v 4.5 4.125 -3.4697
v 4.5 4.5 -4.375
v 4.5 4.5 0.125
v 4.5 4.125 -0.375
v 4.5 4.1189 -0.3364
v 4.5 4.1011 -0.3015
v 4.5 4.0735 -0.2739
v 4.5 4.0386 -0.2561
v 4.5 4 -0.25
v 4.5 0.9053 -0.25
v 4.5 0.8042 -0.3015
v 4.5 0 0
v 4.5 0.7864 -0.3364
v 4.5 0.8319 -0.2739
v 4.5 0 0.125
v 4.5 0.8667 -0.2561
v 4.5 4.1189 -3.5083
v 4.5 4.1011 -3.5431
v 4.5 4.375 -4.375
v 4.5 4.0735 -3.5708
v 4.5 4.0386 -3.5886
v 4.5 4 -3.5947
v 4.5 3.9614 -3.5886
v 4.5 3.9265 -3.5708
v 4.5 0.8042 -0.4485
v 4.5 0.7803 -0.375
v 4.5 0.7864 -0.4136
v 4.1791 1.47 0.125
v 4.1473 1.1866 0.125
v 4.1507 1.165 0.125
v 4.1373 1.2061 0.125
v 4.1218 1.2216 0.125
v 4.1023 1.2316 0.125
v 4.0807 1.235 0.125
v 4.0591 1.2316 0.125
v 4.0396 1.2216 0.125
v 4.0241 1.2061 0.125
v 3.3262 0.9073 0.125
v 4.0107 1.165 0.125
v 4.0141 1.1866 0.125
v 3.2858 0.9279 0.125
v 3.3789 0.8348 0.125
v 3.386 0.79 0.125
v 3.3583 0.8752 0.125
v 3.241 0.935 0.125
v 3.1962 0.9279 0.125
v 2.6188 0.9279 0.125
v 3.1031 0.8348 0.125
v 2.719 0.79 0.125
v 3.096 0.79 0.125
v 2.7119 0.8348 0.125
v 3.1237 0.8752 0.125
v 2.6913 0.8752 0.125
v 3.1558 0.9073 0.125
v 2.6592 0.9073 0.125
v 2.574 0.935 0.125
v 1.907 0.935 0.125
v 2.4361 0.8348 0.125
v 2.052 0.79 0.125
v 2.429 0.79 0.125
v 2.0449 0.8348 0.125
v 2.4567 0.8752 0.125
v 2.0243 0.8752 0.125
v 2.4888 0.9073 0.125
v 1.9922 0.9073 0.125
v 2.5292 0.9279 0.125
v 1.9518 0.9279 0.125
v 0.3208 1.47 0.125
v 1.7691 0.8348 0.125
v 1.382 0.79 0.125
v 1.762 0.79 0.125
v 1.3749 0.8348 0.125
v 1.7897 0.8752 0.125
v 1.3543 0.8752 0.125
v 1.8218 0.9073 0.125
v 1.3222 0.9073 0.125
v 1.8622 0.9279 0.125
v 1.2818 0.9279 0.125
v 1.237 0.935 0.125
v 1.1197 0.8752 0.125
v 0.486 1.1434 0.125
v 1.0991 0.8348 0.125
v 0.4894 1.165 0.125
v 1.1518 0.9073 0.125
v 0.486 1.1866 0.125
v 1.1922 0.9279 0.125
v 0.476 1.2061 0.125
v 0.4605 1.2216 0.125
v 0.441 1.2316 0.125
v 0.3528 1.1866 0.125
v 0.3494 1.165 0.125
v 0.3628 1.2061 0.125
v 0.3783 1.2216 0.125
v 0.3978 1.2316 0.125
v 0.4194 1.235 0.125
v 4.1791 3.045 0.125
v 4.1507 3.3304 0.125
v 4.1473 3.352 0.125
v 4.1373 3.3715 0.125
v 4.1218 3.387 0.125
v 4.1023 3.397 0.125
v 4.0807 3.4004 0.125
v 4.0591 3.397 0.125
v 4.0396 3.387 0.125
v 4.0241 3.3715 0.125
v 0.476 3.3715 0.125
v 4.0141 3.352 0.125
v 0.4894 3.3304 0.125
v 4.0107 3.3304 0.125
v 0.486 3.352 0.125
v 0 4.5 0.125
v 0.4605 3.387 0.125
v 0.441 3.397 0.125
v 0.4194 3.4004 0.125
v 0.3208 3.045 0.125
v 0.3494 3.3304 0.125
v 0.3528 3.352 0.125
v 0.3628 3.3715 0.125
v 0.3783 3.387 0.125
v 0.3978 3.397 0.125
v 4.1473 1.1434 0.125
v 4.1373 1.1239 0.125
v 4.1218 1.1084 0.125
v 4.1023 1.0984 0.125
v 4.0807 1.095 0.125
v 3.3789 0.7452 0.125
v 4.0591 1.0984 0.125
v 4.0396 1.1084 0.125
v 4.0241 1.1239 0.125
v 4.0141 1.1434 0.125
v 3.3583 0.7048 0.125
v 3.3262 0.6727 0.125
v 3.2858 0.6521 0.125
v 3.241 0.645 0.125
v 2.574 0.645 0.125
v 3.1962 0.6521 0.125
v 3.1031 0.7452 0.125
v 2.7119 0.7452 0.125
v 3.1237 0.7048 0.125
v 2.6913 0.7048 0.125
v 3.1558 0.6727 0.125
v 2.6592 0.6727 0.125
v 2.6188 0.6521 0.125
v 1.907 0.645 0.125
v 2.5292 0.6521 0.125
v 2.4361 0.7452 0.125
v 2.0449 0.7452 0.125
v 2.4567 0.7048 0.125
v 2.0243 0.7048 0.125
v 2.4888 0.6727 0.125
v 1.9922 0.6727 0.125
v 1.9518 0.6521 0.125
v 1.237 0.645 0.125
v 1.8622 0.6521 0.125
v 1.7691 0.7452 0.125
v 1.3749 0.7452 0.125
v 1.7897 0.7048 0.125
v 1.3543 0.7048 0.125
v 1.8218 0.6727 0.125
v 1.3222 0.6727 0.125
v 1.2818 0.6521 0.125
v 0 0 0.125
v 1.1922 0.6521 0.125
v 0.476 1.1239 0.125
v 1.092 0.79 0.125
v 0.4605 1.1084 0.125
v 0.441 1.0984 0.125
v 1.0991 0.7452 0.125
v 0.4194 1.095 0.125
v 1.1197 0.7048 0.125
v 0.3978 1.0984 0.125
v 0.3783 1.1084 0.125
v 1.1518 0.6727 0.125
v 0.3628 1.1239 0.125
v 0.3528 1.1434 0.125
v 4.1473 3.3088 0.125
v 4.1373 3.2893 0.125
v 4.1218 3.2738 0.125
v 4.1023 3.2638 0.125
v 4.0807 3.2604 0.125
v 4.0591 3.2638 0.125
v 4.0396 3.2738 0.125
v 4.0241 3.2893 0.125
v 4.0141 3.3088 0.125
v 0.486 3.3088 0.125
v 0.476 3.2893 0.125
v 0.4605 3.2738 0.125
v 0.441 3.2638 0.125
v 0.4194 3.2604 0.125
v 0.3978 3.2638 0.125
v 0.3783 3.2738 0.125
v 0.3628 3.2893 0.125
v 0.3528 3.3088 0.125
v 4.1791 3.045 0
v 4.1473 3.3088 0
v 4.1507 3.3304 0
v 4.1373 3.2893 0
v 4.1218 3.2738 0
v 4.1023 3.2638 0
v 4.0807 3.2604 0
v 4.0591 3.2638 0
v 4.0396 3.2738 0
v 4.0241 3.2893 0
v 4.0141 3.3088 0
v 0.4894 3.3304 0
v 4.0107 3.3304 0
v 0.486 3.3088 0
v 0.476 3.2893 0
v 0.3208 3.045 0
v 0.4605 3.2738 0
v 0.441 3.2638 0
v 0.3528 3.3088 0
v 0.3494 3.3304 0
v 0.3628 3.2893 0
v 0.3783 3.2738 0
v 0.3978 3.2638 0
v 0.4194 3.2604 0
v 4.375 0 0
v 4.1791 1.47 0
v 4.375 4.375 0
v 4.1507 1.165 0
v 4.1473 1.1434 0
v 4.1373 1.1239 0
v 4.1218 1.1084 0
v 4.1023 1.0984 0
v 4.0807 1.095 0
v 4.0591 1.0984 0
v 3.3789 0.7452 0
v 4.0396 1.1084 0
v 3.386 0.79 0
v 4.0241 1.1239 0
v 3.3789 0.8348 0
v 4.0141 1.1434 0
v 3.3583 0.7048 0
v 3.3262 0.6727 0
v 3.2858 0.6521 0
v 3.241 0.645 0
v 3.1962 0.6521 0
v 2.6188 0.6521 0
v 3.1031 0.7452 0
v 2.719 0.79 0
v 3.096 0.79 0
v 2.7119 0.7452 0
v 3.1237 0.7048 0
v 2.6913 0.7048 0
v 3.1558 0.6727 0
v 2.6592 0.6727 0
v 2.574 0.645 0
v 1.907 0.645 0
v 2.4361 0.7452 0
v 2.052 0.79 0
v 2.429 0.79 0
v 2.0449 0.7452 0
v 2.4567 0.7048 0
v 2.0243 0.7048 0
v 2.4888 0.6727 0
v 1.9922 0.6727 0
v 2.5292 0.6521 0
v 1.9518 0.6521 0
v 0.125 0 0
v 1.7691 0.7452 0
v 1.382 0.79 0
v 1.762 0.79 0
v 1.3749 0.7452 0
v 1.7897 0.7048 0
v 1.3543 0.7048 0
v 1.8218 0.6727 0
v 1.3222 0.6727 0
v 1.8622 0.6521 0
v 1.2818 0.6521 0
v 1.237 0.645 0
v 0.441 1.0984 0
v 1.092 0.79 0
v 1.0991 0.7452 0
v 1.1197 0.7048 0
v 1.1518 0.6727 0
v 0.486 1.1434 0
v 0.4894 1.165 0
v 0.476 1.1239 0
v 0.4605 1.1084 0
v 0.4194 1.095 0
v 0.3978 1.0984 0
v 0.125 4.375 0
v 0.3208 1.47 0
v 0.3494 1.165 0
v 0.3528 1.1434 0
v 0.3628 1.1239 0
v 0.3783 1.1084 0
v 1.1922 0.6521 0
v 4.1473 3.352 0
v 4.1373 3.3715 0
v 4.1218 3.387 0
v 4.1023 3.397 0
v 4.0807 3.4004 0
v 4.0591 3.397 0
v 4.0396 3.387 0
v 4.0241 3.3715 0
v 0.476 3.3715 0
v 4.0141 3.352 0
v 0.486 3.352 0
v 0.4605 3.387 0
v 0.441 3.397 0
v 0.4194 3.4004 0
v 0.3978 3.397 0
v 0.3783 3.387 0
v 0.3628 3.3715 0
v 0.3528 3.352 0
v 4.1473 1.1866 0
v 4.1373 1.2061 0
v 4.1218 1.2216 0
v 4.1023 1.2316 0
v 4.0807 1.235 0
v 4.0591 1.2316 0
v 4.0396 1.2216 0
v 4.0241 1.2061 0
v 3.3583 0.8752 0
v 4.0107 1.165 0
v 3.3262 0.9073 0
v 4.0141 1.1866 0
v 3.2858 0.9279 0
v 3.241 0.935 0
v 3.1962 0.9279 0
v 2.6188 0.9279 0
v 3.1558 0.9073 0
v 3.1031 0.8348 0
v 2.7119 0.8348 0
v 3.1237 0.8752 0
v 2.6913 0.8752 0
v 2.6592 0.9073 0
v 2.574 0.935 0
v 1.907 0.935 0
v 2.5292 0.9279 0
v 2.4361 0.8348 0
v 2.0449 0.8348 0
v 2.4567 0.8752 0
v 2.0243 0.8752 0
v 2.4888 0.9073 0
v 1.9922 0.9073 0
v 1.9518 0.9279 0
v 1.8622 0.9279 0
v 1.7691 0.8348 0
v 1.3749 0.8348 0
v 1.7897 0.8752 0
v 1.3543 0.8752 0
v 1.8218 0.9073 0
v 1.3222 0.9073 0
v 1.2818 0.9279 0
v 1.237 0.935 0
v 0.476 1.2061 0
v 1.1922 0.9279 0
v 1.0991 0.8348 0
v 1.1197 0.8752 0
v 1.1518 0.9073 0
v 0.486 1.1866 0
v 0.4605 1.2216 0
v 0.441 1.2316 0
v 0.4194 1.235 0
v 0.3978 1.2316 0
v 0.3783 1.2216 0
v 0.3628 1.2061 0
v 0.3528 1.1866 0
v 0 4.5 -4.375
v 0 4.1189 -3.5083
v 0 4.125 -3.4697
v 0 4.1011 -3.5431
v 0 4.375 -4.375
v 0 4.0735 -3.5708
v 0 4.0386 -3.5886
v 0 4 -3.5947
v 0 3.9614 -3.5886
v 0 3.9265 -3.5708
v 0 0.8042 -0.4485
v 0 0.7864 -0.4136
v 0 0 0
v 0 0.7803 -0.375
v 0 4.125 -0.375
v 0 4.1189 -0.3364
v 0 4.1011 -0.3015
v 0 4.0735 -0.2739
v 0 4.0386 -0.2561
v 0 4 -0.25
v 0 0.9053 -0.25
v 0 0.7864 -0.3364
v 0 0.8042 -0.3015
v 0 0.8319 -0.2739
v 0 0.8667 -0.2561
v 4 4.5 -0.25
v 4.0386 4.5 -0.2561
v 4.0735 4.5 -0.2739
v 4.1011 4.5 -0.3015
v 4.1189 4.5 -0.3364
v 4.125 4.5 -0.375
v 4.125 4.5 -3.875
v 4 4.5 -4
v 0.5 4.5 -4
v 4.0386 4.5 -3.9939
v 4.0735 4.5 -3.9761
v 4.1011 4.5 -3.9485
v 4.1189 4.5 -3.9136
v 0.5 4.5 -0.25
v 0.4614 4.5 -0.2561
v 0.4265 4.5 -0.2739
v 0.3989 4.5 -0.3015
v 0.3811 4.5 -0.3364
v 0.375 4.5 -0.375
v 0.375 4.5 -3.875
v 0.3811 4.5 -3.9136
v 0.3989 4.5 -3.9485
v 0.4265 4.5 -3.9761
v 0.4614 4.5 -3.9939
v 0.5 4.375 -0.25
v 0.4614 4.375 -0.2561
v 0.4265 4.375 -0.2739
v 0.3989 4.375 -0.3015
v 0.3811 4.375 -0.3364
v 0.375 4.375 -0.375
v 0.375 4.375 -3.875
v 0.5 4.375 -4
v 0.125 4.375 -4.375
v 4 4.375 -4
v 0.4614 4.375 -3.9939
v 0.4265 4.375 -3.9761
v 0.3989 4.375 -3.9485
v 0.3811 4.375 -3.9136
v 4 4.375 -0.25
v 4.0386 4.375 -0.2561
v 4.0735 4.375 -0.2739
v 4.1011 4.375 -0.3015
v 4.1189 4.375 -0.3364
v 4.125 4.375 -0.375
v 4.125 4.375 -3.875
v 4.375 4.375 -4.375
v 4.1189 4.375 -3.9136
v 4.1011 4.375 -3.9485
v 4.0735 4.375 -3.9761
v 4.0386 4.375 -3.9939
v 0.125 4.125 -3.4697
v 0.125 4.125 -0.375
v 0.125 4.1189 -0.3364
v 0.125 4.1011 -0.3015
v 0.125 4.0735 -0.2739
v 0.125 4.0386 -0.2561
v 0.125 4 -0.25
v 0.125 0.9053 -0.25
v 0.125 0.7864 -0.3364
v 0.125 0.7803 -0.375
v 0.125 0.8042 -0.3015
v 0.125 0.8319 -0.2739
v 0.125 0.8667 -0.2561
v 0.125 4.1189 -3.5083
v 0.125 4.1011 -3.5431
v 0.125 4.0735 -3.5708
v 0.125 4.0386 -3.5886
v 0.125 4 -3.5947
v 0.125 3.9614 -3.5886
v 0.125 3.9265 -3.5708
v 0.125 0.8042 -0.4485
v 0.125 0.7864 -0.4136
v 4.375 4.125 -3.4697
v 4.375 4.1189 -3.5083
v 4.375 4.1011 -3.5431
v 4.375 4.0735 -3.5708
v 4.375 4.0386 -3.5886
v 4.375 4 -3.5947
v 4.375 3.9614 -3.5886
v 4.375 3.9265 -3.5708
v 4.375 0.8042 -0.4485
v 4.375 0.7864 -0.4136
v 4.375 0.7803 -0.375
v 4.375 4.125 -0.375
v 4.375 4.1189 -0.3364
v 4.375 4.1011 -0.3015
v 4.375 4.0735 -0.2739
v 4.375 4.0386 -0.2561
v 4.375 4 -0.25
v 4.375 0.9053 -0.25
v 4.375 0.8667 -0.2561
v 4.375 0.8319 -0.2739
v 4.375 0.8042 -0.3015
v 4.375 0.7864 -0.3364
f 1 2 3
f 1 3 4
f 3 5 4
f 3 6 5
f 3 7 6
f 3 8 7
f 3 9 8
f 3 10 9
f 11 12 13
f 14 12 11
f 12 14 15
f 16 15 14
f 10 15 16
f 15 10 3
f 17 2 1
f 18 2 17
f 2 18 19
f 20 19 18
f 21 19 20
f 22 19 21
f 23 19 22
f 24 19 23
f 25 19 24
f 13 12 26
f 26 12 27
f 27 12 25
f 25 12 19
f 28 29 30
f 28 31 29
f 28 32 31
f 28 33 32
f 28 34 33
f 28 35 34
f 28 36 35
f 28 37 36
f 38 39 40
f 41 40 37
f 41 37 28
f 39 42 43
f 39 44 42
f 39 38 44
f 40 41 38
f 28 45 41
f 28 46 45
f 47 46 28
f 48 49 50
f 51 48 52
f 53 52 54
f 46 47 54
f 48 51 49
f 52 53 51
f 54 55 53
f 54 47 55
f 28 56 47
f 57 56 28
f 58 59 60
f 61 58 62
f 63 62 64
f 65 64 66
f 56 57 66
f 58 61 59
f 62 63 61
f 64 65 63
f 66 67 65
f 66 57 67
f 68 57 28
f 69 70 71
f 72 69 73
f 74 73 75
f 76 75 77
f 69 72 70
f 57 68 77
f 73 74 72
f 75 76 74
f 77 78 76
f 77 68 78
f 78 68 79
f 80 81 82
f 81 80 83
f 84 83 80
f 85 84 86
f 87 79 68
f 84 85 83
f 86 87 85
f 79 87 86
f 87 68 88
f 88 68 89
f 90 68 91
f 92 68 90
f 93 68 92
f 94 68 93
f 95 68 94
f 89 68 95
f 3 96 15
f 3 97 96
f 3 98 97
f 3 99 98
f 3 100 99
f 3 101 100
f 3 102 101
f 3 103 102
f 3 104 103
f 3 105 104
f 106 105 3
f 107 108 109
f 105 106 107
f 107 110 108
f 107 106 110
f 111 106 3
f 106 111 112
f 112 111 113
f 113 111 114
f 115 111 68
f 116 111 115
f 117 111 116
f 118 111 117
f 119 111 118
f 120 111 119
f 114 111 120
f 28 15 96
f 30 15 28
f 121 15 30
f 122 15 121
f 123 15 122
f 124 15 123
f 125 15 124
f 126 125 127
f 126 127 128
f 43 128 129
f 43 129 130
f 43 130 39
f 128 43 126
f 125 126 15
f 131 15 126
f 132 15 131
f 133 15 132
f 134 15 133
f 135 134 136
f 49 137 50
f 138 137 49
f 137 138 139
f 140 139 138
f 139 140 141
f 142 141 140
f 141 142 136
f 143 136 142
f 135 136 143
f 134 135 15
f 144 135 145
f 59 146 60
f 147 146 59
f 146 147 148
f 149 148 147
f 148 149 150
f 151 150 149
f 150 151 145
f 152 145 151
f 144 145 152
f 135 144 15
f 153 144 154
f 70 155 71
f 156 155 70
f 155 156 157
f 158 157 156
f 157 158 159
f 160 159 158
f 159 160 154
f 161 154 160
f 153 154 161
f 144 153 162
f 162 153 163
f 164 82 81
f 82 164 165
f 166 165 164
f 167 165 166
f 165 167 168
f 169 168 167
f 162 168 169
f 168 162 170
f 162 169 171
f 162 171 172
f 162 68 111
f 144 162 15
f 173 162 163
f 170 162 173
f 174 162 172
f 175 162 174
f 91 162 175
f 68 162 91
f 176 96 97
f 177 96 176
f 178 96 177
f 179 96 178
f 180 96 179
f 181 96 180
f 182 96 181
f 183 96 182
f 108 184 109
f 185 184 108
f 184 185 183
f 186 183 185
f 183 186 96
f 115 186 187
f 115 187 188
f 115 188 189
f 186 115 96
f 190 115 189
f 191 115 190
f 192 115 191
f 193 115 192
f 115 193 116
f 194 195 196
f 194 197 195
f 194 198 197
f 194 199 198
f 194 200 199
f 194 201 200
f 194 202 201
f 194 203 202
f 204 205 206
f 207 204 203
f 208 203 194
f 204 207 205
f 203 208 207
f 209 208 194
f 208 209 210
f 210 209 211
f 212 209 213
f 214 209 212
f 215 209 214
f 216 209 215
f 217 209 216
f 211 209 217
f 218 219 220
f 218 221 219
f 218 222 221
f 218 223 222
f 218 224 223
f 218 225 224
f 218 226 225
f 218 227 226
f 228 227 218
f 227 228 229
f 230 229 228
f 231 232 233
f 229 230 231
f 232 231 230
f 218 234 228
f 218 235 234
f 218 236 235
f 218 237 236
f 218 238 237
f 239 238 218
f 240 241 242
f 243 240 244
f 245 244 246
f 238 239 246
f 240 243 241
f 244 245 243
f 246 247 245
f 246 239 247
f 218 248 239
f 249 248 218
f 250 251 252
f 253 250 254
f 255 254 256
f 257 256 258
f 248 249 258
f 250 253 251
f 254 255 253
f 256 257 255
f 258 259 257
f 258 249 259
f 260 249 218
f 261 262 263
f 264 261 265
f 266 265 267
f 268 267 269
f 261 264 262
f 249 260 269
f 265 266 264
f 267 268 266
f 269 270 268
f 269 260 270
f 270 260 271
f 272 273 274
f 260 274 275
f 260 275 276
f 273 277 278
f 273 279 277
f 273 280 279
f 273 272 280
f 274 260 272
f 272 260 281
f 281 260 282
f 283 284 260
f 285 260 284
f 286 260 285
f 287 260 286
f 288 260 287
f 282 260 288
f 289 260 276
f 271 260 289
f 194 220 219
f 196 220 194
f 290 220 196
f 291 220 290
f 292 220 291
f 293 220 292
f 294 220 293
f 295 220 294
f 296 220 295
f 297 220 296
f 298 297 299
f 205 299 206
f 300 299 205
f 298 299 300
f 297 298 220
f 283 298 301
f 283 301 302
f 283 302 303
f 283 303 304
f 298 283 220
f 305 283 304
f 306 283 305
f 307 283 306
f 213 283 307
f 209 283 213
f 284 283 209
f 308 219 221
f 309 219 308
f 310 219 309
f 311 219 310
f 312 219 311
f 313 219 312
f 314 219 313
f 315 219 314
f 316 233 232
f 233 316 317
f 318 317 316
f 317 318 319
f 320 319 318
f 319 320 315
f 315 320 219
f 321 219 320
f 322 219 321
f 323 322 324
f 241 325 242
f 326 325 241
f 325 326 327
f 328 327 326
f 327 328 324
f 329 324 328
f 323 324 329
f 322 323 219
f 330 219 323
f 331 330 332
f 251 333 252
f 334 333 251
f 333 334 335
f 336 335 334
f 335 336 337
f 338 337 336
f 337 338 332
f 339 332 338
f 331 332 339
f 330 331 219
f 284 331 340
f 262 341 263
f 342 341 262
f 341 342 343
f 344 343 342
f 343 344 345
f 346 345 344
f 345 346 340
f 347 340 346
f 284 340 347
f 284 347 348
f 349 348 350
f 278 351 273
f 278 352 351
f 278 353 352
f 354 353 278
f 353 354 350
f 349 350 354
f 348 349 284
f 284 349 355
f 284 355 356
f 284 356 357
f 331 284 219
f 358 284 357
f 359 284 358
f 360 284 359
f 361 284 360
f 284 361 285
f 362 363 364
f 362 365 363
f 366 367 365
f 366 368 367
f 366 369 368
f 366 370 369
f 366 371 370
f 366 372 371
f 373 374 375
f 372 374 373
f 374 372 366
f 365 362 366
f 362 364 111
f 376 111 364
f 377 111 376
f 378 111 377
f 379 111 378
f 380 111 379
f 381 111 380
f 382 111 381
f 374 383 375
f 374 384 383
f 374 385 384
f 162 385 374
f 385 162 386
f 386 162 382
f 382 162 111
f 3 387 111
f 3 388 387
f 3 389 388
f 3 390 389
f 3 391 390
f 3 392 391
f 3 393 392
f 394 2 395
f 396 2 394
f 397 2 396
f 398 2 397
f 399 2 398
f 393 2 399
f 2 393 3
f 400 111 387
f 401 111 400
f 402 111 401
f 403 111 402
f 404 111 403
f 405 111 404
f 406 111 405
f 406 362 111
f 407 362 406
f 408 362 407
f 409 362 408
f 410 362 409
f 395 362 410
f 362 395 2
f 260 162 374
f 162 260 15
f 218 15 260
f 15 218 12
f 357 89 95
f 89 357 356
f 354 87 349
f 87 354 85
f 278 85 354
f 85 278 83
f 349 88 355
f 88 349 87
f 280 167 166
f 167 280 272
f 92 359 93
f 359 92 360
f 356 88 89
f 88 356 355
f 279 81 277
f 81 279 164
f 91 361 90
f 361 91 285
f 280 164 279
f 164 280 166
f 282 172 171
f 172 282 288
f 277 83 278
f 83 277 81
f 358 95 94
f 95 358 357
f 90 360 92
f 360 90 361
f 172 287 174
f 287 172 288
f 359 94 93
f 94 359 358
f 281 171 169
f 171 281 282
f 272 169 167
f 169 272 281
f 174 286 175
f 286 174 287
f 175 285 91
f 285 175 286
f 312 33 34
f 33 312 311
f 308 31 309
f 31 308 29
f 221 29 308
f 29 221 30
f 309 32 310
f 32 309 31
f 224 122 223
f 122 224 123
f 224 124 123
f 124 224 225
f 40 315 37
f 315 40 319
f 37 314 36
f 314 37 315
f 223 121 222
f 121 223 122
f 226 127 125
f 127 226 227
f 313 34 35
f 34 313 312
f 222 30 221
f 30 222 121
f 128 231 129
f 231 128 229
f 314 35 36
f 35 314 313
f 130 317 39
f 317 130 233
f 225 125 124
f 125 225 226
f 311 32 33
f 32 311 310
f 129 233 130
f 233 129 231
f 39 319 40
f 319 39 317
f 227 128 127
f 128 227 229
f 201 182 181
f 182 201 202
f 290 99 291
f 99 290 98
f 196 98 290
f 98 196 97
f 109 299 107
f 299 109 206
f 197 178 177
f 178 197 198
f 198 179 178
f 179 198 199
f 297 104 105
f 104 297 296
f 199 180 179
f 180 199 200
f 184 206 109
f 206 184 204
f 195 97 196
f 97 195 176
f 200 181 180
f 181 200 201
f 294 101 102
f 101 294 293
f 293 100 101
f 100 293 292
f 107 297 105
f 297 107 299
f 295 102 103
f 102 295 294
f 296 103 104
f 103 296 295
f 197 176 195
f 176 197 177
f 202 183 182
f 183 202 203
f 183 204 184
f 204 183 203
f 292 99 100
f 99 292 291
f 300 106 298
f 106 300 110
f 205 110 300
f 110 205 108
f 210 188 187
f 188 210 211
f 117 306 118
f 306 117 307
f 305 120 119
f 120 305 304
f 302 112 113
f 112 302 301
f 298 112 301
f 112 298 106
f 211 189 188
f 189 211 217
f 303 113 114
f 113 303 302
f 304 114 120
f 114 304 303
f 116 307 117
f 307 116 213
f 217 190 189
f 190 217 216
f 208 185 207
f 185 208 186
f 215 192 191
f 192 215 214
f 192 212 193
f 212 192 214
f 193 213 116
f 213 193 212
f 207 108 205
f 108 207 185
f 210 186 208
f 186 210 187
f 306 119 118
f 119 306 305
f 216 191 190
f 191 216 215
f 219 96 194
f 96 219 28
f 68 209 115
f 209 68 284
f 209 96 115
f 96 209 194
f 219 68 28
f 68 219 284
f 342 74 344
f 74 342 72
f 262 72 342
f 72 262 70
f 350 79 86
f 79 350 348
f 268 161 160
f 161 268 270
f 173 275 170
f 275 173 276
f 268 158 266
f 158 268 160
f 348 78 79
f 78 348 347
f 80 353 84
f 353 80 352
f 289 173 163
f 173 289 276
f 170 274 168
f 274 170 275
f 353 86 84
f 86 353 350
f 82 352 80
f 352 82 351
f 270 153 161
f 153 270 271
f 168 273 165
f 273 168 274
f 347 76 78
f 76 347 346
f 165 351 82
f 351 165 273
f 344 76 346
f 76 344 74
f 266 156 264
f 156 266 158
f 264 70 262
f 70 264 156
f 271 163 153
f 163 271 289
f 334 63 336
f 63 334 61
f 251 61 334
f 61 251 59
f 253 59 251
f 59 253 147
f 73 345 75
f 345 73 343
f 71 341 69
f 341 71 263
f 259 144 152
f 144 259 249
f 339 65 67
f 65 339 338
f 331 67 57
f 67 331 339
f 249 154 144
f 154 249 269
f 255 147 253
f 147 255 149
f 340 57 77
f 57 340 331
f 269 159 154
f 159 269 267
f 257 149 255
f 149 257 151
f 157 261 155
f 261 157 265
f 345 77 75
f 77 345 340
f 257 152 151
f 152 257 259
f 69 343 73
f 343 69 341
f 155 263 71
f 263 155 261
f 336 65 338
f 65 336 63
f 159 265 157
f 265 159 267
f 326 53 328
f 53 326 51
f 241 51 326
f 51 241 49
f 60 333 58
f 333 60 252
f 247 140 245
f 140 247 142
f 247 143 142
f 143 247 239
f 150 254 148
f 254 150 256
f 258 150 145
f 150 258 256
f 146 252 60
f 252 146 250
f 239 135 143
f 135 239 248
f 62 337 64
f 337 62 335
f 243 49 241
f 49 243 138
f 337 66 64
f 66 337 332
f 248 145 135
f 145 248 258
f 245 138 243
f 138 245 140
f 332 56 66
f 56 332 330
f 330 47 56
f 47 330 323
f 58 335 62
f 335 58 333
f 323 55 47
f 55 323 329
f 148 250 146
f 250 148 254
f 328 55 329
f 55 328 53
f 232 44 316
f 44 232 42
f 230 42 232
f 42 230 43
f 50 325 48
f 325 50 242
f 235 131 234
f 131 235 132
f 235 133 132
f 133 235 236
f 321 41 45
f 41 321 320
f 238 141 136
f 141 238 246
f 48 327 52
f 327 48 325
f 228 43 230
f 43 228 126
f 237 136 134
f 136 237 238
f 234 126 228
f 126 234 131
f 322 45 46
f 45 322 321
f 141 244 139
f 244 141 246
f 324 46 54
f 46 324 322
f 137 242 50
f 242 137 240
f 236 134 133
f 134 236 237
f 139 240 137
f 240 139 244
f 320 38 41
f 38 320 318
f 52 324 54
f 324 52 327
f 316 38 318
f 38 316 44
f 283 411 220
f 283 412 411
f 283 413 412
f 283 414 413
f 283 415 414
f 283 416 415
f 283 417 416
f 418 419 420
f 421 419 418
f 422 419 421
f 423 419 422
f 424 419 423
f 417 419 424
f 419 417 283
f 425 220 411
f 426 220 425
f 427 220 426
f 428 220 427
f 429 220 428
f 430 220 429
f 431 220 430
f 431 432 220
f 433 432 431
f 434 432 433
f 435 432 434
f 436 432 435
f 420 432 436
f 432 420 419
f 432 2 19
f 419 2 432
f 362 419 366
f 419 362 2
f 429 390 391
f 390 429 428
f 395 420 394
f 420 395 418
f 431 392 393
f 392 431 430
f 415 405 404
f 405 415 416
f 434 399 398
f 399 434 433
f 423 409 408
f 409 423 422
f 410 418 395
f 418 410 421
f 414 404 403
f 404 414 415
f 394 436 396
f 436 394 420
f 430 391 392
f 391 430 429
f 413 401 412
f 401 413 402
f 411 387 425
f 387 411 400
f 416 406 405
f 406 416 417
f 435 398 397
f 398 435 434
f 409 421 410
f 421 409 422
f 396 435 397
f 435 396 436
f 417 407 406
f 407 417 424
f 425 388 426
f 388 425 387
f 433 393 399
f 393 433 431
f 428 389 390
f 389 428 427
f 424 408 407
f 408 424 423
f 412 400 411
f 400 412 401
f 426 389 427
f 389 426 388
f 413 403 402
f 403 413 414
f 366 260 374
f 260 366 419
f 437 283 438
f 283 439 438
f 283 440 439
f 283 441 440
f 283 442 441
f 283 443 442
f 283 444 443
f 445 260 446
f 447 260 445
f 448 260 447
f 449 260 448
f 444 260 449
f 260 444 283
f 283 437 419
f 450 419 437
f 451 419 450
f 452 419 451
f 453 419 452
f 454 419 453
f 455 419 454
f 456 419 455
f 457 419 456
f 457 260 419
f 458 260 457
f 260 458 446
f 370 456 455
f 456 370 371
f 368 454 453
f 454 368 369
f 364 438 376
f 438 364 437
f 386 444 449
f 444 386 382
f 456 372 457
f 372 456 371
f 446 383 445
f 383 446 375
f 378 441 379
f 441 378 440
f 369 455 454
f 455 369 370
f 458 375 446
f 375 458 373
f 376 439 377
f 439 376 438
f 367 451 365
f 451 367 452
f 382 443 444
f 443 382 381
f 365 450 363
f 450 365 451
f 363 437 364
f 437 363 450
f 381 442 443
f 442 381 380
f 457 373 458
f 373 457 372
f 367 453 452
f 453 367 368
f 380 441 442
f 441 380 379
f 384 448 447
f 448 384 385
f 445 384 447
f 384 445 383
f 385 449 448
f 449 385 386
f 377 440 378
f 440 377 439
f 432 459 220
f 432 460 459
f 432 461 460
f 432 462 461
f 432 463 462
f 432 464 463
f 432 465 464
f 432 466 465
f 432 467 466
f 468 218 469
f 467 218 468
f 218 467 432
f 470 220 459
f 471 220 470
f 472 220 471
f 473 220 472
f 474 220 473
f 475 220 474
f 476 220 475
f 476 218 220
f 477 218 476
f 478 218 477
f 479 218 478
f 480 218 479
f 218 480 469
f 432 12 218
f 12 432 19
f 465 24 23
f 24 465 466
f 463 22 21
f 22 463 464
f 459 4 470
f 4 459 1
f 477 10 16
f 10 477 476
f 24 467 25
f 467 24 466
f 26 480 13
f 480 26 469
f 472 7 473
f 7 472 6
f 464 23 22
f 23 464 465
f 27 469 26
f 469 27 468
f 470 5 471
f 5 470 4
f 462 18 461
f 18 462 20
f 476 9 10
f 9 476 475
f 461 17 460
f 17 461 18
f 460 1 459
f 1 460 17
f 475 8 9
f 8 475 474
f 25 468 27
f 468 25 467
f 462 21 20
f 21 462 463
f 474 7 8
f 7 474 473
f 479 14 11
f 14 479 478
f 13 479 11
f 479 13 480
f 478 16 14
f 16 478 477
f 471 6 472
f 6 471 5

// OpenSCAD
$fn=20;
difference() {
	cube([4.5,4.5,0.125]);
	// Mounting Holes
//	translate([0.375,0.375,-0.125]) cylinder(r=0.07,h=0.375);
//	translate([4.125,0.375,-0.125]) cylinder(r=0.07,h=0.375);
//	translate([4.125,3.625,-0.125]) cylinder(r=0.07,h=0.375);
//	translate([0.375,3.625,-0.125]) cylinder(r=0.07,h=0.375);
	// PCB Holes
	translate([0.4194,1.165,-0.125]) cylinder(r=0.07,h=0.375);
	translate([4.0807,1.165,-0.125]) cylinder(r=0.07,h=0.375);
	translate([4.0807,3.3304,-0.125]) cylinder(r=0.07,h=0.375);
	translate([0.4194,3.3304,-0.125]) cylinder(r=0.07,h=0.375);
	// Display Cutout
	translate([0.32085,1.47,-0.125]) cube([3.8583,1.575,0.375]);
	// Switch Holes
	translate([1.237,0.79,-0.125]) cylinder(r=0.145,h=0.375);
	translate([1.907,0.79,-0.125]) cylinder(r=0.145,h=0.375);
	translate([2.574,0.79,-0.125]) cylinder(r=0.145,h=0.375);
	translate([3.241,0.79,-0.125]) cylinder(r=0.145,h=0.375);
}

// Back
translate([0,4.375,0.125]) {
	rotate(a=[-90,0,0]) {
		difference() {
			cube([4.5,4.5,0.125]);
			translate([0.375,0.375,-0.125]) {
				hull() {
					translate([0.125,0.125,0]) cylinder(r=0.125,h=0.375);
					translate([3.625,0.125,0]) cylinder(r=0.125,h=0.375);
					translate([3.625,3.625,0]) cylinder(r=0.125,h=0.375);
					translate([0.125,3.625,0]) cylinder(r=0.125,h=0.375);
				}
			}
		}
	}
}

// Sides
translate([0.0625,0,0])
rotate(a=[0,90,0])
difference() {
	linear_extrude(height = 0.125, center = true, convexity = 10, twist = 0)
	polygon(points=[[0,0],[4.375,4.375],[0,4.375]], paths=[[0,1,2]]);
	translate([0,0,-0.125]) {
		hull() {
			translate([0.375,4,0]) cylinder(r=0.125,h=0.25);
			translate([0.375,0.90533,0]) cylinder(r=0.125,h=0.25);
			translate([3.46967,4,0]) cylinder(r=0.125,h=0.25);
		}
	}
}

translate([4.4375,0,0])
rotate(a=[0,90,0])
difference() {
	linear_extrude(height = 0.125, center = true, convexity = 10, twist = 0)
	polygon(points=[[0,0],[4.375,4.375],[0,4.375]], paths=[[0,1,2]]);
	translate([0,0,-0.125]) {
		hull() {
			translate([0.375,4,0]) cylinder(r=0.125,h=0.25);
			translate([0.375,0.90533,0]) cylinder(r=0.125,h=0.25);
			translate([3.46967,4,0]) cylinder(r=0.125,h=0.25);
		}
	}
}
